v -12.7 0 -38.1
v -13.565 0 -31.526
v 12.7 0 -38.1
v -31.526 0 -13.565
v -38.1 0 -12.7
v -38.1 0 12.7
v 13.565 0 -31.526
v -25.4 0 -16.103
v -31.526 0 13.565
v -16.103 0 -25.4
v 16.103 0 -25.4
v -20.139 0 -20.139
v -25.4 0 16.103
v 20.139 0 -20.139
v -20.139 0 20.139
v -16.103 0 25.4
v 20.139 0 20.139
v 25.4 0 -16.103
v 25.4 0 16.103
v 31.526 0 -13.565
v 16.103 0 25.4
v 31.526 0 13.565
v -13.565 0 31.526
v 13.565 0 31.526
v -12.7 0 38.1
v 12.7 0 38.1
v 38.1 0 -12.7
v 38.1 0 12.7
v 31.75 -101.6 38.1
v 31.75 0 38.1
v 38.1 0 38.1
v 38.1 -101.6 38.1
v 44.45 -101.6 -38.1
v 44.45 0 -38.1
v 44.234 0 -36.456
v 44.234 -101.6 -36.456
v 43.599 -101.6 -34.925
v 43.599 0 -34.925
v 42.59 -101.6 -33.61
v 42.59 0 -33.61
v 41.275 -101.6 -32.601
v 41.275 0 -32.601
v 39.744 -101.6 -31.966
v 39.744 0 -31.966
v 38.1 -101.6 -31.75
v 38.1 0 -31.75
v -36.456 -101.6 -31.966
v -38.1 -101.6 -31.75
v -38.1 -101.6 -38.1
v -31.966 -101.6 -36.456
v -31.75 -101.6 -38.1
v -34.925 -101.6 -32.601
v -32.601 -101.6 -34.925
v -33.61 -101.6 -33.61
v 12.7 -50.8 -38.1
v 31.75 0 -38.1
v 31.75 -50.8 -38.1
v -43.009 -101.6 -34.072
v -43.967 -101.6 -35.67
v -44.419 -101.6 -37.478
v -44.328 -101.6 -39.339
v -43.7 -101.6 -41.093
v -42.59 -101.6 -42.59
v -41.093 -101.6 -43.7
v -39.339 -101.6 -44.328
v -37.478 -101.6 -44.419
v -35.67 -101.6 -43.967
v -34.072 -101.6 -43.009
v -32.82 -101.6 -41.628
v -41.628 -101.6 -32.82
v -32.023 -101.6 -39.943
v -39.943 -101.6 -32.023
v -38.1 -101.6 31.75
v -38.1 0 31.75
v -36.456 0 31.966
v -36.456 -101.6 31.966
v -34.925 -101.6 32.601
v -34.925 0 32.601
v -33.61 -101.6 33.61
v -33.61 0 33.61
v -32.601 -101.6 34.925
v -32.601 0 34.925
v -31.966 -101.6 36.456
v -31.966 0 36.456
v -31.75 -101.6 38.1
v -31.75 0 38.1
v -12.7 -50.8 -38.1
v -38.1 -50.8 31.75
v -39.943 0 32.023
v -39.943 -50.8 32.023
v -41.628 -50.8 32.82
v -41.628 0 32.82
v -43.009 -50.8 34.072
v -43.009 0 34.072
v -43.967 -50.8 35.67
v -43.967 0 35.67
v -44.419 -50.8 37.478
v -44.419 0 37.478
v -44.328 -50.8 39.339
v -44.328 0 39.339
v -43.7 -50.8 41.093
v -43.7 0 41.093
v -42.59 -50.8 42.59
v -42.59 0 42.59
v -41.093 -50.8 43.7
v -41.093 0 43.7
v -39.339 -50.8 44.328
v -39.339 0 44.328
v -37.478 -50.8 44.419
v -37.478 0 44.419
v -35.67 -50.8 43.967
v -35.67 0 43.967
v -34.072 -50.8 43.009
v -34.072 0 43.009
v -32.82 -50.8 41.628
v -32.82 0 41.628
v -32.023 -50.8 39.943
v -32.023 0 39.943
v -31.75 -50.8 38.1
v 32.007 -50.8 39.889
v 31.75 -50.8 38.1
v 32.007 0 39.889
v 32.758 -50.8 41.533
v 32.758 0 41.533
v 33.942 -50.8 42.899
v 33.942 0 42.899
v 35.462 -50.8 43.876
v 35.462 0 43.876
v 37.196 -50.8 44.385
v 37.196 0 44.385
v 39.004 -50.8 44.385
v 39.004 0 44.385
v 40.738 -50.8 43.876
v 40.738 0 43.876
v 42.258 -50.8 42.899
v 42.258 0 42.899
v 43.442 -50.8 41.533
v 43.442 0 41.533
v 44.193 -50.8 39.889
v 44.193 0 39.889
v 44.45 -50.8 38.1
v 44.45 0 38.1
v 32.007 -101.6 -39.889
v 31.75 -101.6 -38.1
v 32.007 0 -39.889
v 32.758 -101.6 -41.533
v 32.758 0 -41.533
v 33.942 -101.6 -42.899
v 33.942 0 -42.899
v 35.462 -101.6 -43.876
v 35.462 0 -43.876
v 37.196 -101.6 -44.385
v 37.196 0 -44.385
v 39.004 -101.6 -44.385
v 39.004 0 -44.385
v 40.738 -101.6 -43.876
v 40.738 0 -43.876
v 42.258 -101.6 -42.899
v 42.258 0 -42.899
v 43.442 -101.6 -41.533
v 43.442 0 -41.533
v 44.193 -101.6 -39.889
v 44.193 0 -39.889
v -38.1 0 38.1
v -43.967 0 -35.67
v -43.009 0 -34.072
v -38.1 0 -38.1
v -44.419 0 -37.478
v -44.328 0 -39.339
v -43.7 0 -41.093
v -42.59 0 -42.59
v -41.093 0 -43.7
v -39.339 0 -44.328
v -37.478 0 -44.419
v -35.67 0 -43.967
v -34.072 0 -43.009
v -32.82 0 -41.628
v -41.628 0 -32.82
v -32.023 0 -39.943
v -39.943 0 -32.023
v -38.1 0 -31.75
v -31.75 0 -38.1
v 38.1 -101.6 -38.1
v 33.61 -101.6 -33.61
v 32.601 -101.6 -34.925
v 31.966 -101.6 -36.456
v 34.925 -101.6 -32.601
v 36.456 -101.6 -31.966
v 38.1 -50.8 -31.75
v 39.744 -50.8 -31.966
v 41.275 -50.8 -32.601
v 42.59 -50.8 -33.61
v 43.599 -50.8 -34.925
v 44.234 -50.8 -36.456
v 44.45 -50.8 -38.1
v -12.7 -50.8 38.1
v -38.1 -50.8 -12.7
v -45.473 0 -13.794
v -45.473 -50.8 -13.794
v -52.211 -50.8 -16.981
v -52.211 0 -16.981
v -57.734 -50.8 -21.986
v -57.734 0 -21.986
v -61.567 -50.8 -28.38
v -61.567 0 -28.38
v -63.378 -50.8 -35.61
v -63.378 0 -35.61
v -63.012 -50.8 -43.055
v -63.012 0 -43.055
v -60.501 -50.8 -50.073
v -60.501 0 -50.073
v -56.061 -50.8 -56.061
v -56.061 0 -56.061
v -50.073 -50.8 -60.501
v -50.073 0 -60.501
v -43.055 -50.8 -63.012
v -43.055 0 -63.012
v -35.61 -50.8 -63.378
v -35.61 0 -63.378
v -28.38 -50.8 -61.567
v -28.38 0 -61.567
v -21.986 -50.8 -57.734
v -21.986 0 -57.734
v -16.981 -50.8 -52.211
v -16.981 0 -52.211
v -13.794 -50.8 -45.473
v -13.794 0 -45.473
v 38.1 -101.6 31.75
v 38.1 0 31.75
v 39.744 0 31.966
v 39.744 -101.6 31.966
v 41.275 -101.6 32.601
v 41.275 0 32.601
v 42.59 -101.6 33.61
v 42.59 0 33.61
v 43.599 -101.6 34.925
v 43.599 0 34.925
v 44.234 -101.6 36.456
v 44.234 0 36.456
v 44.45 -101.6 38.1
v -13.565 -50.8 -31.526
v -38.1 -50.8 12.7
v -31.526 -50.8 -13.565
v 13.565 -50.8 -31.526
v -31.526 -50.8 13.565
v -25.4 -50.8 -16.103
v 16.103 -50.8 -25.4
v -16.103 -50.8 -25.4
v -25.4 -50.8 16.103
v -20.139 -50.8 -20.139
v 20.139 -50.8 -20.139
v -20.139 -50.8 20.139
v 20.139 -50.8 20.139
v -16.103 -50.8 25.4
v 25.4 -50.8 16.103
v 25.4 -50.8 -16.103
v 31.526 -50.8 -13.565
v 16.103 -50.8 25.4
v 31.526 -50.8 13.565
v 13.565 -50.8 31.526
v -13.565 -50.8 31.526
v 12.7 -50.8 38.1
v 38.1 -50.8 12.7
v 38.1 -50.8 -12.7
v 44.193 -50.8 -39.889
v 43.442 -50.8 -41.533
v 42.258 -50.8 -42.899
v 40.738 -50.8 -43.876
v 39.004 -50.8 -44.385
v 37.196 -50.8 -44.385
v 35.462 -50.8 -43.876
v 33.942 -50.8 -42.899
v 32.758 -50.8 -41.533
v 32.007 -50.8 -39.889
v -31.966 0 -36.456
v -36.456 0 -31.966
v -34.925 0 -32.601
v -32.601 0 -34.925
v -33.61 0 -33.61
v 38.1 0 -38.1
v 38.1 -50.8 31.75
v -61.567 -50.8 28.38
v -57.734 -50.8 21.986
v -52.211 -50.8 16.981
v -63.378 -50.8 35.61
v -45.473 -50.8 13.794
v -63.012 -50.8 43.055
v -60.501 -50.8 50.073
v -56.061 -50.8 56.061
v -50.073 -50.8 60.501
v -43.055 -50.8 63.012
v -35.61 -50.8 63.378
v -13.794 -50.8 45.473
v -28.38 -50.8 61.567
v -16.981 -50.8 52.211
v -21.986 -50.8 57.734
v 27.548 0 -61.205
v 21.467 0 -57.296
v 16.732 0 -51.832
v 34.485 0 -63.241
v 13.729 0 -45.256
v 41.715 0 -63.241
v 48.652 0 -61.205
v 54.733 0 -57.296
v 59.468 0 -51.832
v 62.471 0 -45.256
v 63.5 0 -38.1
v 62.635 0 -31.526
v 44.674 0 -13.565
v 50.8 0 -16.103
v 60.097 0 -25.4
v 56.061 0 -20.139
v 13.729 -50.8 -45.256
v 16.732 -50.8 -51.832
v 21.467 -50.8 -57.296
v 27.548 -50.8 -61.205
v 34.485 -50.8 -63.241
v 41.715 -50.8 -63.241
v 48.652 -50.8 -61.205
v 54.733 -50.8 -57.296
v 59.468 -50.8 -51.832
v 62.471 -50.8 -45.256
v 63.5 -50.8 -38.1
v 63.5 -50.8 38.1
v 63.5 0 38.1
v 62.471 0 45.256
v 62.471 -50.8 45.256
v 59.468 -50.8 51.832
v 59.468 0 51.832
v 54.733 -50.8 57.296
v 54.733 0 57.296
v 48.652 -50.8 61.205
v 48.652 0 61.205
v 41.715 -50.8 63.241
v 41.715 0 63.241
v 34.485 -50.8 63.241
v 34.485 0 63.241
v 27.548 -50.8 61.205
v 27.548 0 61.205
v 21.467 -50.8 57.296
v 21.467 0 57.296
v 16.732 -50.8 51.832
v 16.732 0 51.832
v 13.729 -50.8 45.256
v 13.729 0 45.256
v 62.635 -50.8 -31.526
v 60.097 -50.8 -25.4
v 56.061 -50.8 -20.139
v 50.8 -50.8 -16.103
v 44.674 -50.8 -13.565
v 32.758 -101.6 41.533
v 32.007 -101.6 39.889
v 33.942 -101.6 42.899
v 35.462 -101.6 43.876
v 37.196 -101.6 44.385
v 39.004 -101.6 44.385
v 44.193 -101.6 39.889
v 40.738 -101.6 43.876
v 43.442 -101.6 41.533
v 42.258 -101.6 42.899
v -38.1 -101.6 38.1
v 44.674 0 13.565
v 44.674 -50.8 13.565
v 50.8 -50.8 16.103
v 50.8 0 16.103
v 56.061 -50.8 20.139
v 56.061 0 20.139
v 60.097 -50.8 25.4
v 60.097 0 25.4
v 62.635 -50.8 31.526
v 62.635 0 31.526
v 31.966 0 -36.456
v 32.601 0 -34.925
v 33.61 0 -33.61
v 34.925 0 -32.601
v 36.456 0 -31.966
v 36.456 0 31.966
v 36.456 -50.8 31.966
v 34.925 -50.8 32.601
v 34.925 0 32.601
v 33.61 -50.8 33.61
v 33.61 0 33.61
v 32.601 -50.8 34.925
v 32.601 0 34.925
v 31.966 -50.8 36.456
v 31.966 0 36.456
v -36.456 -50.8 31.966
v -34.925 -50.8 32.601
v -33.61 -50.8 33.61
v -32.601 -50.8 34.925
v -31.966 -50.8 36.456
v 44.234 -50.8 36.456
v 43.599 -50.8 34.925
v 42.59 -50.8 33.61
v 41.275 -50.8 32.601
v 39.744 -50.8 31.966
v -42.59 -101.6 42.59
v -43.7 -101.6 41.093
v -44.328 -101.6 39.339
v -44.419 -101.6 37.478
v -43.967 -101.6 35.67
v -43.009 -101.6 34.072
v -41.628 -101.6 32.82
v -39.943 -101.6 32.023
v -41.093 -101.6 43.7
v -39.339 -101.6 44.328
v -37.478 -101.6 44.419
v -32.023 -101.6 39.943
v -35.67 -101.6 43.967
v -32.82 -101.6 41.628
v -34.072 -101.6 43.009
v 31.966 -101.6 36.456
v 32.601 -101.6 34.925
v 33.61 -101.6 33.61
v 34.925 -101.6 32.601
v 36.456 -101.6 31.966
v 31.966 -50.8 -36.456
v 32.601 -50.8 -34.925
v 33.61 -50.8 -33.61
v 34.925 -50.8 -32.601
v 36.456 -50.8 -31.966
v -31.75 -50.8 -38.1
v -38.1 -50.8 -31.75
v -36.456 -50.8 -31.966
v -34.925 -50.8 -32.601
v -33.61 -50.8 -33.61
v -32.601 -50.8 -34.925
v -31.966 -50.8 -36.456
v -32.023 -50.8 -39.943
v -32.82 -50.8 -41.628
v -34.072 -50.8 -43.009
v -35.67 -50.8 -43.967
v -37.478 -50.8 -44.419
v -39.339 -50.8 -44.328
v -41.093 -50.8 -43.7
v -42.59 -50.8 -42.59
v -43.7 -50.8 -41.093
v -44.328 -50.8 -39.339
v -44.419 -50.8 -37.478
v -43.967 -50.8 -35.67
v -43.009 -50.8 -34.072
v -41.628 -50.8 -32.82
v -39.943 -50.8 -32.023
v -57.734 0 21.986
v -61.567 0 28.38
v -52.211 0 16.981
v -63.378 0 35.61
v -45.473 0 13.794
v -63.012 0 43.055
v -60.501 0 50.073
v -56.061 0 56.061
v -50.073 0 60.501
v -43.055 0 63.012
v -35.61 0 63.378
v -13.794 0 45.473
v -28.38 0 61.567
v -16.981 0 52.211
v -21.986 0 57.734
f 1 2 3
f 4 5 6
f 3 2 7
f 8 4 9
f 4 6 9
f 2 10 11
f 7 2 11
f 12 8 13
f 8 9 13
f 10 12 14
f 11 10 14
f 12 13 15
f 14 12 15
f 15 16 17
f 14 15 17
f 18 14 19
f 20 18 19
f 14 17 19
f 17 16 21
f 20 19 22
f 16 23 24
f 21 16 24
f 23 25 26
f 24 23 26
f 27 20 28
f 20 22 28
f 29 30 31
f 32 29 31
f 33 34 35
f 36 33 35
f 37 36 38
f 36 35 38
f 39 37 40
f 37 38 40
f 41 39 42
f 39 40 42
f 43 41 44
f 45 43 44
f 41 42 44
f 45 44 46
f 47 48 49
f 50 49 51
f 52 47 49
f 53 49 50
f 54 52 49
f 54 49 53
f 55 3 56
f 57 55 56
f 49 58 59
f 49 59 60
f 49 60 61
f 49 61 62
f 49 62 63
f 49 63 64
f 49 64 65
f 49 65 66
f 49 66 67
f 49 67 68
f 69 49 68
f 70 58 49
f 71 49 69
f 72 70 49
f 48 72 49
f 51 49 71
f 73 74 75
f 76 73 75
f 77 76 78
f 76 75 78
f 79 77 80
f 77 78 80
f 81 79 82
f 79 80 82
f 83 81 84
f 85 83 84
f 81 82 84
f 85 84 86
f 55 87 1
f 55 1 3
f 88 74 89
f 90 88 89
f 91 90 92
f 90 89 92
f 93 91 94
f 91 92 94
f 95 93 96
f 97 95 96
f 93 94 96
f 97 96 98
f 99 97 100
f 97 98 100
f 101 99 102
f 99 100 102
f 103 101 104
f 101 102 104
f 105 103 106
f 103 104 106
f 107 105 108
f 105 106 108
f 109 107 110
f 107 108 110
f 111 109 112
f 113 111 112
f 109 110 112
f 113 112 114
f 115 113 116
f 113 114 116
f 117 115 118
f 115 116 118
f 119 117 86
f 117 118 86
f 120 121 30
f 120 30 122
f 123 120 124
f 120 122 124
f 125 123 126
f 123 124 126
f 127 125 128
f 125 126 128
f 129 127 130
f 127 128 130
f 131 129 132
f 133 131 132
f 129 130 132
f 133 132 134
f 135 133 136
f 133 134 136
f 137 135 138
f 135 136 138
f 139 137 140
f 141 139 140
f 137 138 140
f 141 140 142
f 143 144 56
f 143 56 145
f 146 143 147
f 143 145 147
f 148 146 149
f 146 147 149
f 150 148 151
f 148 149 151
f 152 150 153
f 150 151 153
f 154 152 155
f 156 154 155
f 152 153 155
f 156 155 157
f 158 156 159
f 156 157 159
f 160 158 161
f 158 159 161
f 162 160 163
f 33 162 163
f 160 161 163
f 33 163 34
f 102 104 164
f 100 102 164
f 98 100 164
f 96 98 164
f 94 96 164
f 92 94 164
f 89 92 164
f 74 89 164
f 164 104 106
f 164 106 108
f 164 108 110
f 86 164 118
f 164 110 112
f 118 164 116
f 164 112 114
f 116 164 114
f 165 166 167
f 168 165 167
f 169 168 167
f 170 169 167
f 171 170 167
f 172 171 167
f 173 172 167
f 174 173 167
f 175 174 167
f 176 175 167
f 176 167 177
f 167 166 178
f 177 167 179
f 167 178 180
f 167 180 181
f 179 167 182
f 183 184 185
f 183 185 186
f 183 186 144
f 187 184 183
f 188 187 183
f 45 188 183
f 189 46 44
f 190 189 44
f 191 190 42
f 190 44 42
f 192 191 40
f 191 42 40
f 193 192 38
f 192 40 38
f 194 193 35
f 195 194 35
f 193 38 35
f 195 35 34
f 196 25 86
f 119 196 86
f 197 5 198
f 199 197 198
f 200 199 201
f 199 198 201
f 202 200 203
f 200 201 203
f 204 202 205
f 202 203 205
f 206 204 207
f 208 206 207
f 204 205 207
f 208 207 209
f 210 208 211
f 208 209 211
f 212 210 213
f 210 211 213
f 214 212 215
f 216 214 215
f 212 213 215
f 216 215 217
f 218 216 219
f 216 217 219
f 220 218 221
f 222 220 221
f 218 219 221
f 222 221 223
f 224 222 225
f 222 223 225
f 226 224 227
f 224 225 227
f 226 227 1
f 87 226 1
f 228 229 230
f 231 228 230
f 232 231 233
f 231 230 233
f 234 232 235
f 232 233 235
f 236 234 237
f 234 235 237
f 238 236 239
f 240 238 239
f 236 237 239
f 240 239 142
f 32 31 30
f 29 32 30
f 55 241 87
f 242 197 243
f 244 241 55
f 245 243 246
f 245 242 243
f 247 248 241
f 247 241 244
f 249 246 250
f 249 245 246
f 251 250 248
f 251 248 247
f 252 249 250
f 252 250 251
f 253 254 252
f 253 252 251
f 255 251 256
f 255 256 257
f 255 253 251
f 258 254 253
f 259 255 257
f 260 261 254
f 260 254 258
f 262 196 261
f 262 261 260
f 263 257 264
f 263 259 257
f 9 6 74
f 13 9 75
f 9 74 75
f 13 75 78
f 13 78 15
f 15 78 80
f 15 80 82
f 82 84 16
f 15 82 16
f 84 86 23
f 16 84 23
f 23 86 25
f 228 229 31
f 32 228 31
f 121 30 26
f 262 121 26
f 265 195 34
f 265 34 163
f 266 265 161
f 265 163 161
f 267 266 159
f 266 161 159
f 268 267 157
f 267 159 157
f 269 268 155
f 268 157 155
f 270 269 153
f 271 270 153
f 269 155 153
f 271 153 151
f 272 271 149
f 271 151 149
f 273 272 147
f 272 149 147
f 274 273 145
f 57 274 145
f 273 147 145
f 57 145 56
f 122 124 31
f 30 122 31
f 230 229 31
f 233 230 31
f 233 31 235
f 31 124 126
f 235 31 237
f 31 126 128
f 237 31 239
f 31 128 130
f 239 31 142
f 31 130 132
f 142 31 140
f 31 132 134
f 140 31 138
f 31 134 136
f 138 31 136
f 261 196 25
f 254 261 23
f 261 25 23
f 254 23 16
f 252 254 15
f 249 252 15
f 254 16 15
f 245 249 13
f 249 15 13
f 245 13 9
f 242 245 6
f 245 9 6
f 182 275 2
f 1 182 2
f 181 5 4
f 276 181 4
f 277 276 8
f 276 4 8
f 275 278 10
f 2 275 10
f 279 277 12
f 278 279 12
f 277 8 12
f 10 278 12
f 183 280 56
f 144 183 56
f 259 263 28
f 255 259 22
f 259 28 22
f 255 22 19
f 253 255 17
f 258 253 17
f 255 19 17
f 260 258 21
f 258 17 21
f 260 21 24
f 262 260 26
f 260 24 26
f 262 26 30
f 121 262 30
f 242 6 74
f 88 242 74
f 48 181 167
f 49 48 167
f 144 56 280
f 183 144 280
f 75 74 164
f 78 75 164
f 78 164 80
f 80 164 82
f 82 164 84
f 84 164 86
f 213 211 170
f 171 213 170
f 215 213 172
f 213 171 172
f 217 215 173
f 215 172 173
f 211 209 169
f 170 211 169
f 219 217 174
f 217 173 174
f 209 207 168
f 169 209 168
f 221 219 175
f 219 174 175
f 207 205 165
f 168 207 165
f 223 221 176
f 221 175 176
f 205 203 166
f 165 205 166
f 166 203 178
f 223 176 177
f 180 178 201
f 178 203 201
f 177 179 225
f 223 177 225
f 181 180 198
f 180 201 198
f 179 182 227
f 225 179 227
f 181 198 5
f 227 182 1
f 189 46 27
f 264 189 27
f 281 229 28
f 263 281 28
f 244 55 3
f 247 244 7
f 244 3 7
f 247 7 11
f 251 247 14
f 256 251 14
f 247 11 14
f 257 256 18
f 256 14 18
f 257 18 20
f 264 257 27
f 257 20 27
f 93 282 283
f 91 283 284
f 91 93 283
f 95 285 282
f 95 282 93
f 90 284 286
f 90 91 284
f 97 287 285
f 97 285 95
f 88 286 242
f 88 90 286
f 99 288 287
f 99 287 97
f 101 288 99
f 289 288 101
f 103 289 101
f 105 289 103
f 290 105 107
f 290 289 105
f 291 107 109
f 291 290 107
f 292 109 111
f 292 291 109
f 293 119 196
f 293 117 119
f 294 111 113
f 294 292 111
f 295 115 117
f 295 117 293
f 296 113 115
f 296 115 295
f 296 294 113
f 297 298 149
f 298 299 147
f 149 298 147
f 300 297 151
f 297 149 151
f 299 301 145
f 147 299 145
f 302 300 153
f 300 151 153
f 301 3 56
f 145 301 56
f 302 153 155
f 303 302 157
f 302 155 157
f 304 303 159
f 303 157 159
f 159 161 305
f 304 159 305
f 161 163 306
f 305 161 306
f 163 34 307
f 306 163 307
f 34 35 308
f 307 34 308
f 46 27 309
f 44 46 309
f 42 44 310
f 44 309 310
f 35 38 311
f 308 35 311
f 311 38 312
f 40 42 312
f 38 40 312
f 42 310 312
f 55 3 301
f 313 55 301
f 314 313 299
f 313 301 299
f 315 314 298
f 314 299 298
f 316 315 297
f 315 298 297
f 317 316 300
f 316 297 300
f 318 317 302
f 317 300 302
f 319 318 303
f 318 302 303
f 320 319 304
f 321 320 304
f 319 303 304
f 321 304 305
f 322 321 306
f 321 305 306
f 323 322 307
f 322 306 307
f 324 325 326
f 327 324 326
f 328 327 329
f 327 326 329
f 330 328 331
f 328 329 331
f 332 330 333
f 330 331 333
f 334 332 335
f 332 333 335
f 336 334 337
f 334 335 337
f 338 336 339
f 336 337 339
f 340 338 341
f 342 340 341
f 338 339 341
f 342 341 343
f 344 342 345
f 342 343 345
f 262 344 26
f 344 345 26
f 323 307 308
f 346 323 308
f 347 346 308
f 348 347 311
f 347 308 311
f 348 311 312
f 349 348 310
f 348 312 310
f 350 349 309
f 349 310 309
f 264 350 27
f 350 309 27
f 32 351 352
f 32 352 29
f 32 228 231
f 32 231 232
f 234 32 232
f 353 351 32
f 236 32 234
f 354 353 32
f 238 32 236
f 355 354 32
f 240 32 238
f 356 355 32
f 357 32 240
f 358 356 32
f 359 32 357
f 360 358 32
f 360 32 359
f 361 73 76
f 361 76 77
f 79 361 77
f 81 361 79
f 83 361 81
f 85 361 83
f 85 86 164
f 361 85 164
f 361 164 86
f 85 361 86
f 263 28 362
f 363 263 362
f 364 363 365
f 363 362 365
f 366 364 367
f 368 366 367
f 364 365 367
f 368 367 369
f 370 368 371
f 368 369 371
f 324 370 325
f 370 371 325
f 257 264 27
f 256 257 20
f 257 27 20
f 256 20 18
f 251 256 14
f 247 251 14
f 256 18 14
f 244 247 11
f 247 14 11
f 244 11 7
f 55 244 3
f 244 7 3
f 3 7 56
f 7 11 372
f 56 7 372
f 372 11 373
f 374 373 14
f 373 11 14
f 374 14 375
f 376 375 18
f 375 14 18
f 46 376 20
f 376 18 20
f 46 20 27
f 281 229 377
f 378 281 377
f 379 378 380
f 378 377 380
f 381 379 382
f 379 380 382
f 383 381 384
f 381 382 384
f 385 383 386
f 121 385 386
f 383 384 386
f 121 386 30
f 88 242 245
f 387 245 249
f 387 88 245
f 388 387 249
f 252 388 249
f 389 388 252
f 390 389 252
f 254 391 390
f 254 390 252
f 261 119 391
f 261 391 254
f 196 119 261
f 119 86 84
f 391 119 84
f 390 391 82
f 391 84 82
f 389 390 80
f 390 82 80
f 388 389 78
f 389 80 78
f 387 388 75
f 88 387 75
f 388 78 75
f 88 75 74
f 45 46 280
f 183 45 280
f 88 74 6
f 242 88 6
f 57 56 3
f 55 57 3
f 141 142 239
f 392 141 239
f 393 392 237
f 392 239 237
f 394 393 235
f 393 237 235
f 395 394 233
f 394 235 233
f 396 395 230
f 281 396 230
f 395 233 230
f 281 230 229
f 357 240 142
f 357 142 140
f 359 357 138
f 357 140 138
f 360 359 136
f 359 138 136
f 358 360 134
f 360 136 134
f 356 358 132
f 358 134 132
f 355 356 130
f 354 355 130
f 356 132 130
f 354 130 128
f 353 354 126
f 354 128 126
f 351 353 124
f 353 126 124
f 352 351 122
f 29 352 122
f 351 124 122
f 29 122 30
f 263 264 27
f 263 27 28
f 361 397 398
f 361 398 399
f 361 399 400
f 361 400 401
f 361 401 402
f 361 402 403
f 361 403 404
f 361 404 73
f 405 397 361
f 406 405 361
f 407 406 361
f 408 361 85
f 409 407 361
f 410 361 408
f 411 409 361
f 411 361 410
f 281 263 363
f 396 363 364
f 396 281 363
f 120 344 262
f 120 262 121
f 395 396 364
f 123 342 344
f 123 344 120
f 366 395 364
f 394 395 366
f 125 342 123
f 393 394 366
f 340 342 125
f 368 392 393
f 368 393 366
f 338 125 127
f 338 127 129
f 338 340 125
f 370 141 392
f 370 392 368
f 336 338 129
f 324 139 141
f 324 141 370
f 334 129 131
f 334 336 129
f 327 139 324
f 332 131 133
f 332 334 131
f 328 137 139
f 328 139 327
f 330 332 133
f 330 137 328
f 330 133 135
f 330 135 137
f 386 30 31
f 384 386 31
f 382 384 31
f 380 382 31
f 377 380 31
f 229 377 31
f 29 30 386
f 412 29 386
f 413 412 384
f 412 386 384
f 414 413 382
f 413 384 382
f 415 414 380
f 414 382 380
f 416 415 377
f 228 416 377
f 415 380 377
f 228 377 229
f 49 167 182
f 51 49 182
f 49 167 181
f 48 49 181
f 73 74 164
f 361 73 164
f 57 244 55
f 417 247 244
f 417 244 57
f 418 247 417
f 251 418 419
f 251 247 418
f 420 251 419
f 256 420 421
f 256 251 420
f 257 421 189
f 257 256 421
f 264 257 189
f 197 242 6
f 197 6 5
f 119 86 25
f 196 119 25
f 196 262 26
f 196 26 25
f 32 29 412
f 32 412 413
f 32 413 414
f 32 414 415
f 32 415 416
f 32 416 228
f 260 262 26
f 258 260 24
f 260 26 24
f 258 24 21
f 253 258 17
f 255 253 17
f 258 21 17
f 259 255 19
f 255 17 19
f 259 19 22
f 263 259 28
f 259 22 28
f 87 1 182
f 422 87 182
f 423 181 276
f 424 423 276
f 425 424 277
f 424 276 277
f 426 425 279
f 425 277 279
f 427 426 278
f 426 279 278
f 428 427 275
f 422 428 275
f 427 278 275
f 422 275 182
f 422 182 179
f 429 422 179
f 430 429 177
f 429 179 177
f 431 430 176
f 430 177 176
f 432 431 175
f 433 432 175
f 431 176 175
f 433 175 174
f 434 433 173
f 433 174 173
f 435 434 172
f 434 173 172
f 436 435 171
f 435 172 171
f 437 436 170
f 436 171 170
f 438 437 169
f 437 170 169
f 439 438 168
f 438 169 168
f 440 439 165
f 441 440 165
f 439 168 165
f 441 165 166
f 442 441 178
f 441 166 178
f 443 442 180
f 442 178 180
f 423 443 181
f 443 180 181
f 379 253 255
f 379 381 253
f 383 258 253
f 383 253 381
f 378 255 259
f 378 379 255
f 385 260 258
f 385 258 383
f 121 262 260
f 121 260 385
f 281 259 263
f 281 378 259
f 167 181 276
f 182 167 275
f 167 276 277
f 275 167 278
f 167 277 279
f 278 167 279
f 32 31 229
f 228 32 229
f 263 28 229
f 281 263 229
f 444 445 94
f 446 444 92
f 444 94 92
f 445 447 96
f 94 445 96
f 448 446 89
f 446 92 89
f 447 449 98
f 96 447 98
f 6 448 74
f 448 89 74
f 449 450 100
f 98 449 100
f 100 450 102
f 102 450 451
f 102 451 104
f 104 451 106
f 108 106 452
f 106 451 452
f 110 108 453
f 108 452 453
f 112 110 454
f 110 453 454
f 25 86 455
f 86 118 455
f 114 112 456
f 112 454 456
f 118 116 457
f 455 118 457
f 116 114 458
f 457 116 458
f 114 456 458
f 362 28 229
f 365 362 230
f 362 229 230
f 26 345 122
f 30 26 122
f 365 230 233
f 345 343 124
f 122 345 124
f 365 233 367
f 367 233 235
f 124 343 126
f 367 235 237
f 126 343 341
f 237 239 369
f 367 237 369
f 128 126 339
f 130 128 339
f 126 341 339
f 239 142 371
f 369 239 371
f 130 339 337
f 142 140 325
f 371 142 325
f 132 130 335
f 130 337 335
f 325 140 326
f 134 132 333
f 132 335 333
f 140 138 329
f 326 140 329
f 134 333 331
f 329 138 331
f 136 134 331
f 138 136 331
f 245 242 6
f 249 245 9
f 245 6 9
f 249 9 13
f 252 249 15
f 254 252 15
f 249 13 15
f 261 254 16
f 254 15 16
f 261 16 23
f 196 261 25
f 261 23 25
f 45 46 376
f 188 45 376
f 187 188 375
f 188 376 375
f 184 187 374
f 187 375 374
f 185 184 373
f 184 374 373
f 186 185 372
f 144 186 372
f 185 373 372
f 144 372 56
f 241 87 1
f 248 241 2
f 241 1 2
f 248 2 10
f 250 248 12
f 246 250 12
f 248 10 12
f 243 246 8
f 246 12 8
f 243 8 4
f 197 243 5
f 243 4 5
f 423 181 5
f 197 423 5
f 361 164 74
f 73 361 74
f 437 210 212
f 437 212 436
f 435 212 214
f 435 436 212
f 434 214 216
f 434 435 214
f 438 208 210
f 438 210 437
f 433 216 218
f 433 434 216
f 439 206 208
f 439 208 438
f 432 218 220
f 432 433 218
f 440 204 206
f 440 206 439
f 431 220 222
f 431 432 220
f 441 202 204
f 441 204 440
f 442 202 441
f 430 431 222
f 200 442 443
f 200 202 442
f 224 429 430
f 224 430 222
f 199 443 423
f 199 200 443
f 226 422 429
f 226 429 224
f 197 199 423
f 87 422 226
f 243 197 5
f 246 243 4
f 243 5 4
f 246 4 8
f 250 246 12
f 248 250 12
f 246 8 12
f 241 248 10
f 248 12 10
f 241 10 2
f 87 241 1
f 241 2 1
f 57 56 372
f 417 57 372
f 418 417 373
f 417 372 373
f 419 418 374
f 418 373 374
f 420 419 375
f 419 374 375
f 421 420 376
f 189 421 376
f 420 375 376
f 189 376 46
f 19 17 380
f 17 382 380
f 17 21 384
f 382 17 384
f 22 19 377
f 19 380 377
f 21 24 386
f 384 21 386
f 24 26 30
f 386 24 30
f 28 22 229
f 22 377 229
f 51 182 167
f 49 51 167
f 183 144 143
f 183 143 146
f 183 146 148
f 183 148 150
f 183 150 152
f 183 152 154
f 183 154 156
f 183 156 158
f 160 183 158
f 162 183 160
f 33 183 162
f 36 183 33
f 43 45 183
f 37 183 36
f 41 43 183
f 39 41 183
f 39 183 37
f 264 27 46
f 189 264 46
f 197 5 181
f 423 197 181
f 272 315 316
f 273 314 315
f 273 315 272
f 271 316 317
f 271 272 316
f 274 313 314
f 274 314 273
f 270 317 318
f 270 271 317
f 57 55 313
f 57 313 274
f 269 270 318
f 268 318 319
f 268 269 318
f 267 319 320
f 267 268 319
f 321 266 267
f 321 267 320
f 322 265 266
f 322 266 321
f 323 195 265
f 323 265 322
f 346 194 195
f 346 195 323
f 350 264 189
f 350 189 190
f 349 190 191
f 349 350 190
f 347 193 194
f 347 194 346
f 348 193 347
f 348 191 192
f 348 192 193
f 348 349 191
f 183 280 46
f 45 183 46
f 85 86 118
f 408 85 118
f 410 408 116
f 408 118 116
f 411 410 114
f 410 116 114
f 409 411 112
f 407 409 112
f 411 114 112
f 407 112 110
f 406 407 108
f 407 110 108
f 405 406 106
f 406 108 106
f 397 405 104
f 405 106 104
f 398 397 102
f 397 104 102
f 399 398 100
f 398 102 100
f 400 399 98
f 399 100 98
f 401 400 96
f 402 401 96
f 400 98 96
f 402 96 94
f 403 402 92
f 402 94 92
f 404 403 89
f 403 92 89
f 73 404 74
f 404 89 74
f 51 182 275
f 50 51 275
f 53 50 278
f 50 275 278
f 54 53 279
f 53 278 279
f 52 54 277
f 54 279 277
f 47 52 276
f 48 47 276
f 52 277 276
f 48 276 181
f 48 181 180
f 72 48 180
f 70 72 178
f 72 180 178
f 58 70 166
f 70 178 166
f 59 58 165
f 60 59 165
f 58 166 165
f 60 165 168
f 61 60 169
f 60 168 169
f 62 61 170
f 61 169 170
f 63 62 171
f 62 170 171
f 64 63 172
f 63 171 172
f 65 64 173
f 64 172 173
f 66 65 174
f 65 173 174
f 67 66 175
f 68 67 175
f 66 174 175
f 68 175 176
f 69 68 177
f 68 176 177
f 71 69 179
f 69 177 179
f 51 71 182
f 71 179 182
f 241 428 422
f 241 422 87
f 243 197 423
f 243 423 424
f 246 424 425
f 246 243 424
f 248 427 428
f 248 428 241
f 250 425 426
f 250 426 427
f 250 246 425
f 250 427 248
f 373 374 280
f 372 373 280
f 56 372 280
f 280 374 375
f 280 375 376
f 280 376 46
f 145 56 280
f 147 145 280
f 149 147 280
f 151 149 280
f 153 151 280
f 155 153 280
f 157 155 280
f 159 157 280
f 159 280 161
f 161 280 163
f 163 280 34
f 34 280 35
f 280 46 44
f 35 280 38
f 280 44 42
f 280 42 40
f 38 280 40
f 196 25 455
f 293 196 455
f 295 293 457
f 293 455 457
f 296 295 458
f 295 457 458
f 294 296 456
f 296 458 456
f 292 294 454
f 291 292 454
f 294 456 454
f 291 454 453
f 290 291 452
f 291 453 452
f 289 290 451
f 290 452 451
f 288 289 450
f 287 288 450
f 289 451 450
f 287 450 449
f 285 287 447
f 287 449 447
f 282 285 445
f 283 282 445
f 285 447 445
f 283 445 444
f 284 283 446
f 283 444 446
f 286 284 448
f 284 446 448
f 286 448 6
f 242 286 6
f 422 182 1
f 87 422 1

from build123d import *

# Parameters (mm, degrees)
F1_DEPTH = 50.8
F2_DEPTH = 101.6
F3_DEPTH = 50.8
F4_DEPTH = 101.6


with BuildPart() as f1:
    # F0 (on Front) → F1 (new body)
    with BuildSketch(Plane.XZ):
        with BuildLine():
            Line((12.7, 38.1), (-12.7, 38.1))
            ThreePointArc((-12.7, 38.1), (-20.1394877579, 20.1394877579), (-38.1, 12.7))
            Line((-38.1, 12.7), (-38.1, -12.7))
            ThreePointArc((-38.1, -12.7), (-20.1394877579, -20.1394877579), (-12.7, -38.1))
            Line((-12.7, -38.1), (12.7, -38.1))
            ThreePointArc((12.7, -38.1), (20.1394877579, -20.1394877579), (38.1, -12.7))
            Line((38.1, -12.7), (38.1, 12.7))
            ThreePointArc((38.1, 12.7), (20.1394877579, 20.1394877579), (12.7, 38.1))
        make_face()
    extrude(amount=F1_DEPTH)


with BuildPart() as f1b:
    # F0 (on Front) → F1, piece 2 (new body)
    with BuildSketch(Plane.XZ):
        with BuildLine():
            Line((-31.75, 38.1), (-12.7, 38.1))
            ThreePointArc((-12.7, 38.1), (-56.0605122421, 56.0605122421), (-38.1, 12.7))
            Line((-38.1, 12.7), (-38.1, 31.75))
            ThreePointArc((-38.1, 31.75), (-42.5901280605, 42.5901280605), (-31.75, 38.1))
        make_face()
    extrude(amount=F1_DEPTH)


with BuildPart() as f1c:
    # F0 (on Front) → F1, piece 3 (new body)
    with BuildSketch(Plane.XZ):
        with BuildLine():
            ThreePointArc((63.5, 38.1), (38.1, 63.5), (12.7, 38.1))
            Line((12.7, 38.1), (31.75, 38.1))
            ThreePointArc((31.75, 38.1), (38.1, 44.45), (44.45, 38.1))
            ThreePointArc((44.45, 38.1), (42.5901280605, 33.6098719395), (38.1, 31.75))
            Line((38.1, 31.75), (38.1, 12.7))
            ThreePointArc((38.1, 12.7), (56.0605122421, 20.1394877579), (63.5, 38.1))
        make_face()
    extrude(amount=F1_DEPTH)


with BuildPart() as f1d:
    # F0 (on Front) → F1, piece 4 (new body)
    with BuildSketch(Plane.XZ):
        with BuildLine():
            ThreePointArc((63.5, -38.1), (56.0605122421, -20.1394877579), (38.1, -12.7))
            Line((38.1, -12.7), (38.1, -31.75))
            ThreePointArc((38.1, -31.75), (42.5901280605, -33.6098719395), (44.45, -38.1))
            ThreePointArc((44.45, -38.1), (38.1, -44.45), (31.75, -38.1))
            Line((31.75, -38.1), (12.7, -38.1))
            ThreePointArc((12.7, -38.1), (38.1, -63.5), (63.5, -38.1))
        make_face()
    extrude(amount=F1_DEPTH)


with BuildPart() as f1e:
    # F0 (on Front) → F1, piece 5 (new body)
    with BuildSketch(Plane.XZ):
        with BuildLine():
            Line((-38.1, -31.75), (-38.1, -12.7))
            ThreePointArc((-38.1, -12.7), (-56.0605122421, -56.0605122421), (-12.7, -38.1))
            Line((-12.7, -38.1), (-31.75, -38.1))
            ThreePointArc((-31.75, -38.1), (-42.5901280605, -42.5901280605), (-38.1, -31.75))
        make_face()
    extrude(amount=F1_DEPTH)


with BuildPart() as f2:
    # F0 (on Front) → F2 (new body)
    with BuildSketch(Plane.XZ):
        with BuildLine():
            Line((-38.1, 38.1), (-31.75, 38.1))
            ThreePointArc((-31.75, 38.1), (-42.5901280605, 42.5901280605), (-38.1, 31.75))
            Line((-38.1, 31.75), (-38.1, 38.1))
        make_face()
    extrude(amount=F2_DEPTH)


with BuildPart() as f2b:
    # F0 (on Front) → F2, piece 2 (new body)
    with BuildSketch(Plane.XZ):
        with BuildLine():
            ThreePointArc((44.45, 38.1), (38.1, 44.45), (31.75, 38.1))
            Line((31.75, 38.1), (38.1, 38.1))
            Line((38.1, 38.1), (38.1, 31.75))
            ThreePointArc((38.1, 31.75), (42.5901280605, 33.6098719395), (44.45, 38.1))
        make_face()
    extrude(amount=F2_DEPTH)


with BuildPart() as f2c:
    # F0 (on Front) → F2, piece 3 (new body)
    with BuildSketch(Plane.XZ):
        with BuildLine():
            ThreePointArc((44.45, -38.1), (42.5901280605, -33.6098719395), (38.1, -31.75))
            Line((38.1, -31.75), (38.1, -38.1))
            Line((38.1, -38.1), (31.75, -38.1))
            ThreePointArc((31.75, -38.1), (38.1, -44.45), (44.45, -38.1))
        make_face()
    extrude(amount=F2_DEPTH)


with BuildPart() as f2d:
    # F0 (on Front) → F2, piece 4 (new body)
    with BuildSketch(Plane.XZ):
        with BuildLine():
            Line((-38.1, -38.1), (-38.1, -31.75))
            ThreePointArc((-38.1, -31.75), (-42.5901280605, -42.5901280605), (-31.75, -38.1))
            Line((-31.75, -38.1), (-38.1, -38.1))
        make_face()
    extrude(amount=F2_DEPTH)


with BuildPart() as f3:
    # F0 (on Front) → F3 (new body)
    with BuildSketch(Plane.XZ):
        with BuildLine():
            ThreePointArc((-12.7, -38.1), (-20.1394877579, -20.1394877579), (-38.1, -12.7))
            Line((-38.1, -12.7), (-38.1, -31.75))
            ThreePointArc((-38.1, -31.75), (-33.6098719395, -33.6098719395), (-31.75, -38.1))
            Line((-31.75, -38.1), (-12.7, -38.1))
        make_face()
    extrude(amount=F3_DEPTH)


with BuildPart() as f3b:
    # F0 (on Front) → F3, piece 2 (new body)
    with BuildSketch(Plane.XZ):
        with BuildLine():
            Line((38.1, -31.75), (38.1, -12.7))
            ThreePointArc((38.1, -12.7), (20.1394877579, -20.1394877579), (12.7, -38.1))
            Line((12.7, -38.1), (31.75, -38.1))
            ThreePointArc((31.75, -38.1), (33.6098719395, -33.6098719395), (38.1, -31.75))
        make_face()
    extrude(amount=F3_DEPTH)


with BuildPart() as f3c:
    # F0 (on Front) → F3, piece 3 (new body)
    with BuildSketch(Plane.XZ):
        with BuildLine():
            Line((31.75, 38.1), (12.7, 38.1))
            ThreePointArc((12.7, 38.1), (20.1394877579, 20.1394877579), (38.1, 12.7))
            Line((38.1, 12.7), (38.1, 31.75))
            ThreePointArc((38.1, 31.75), (33.6098719395, 33.6098719395), (31.75, 38.1))
        make_face()
    extrude(amount=F3_DEPTH)


with BuildPart() as f3d:
    # F0 (on Front) → F3, piece 4 (new body)
    with BuildSketch(Plane.XZ):
        with BuildLine():
            ThreePointArc((-38.1, 12.7), (-20.1394877579, 20.1394877579), (-12.7, 38.1))
            Line((-12.7, 38.1), (-31.75, 38.1))
            ThreePointArc((-31.75, 38.1), (-33.6098719395, 33.6098719395), (-38.1, 31.75))
            Line((-38.1, 31.75), (-38.1, 12.7))
        make_face()
    extrude(amount=F3_DEPTH)


with BuildPart() as f4:
    # F0 (on Front) → F4 (new body)
    with BuildSketch(Plane.XZ):
        with BuildLine():
            ThreePointArc((-38.1, 31.75), (-33.6098719395, 33.6098719395), (-31.75, 38.1))
            Line((-31.75, 38.1), (-38.1, 38.1))
            Line((-38.1, 38.1), (-38.1, 31.75))
        make_face()
    extrude(amount=F4_DEPTH)


with BuildPart() as f4b:
    # F0 (on Front) → F4, piece 2 (new body)
    with BuildSketch(Plane.XZ):
        with BuildLine():
            ThreePointArc((-31.75, -38.1), (-33.6098719395, -33.6098719395), (-38.1, -31.75))
            Line((-38.1, -31.75), (-38.1, -38.1))
            Line((-38.1, -38.1), (-31.75, -38.1))
        make_face()
    extrude(amount=F4_DEPTH)


with BuildPart() as f4c:
    # F0 (on Front) → F4, piece 3 (new body)
    with BuildSketch(Plane.XZ):
        with BuildLine():
            Line((38.1, -38.1), (38.1, -31.75))
            ThreePointArc((38.1, -31.75), (33.6098719395, -33.6098719395), (31.75, -38.1))
            Line((31.75, -38.1), (38.1, -38.1))
        make_face()
    extrude(amount=F4_DEPTH)


with BuildPart() as f4d:
    # F0 (on Front) → F4, piece 4 (new body)
    with BuildSketch(Plane.XZ):
        with BuildLine():
            Line((38.1, 38.1), (31.75, 38.1))
            ThreePointArc((31.75, 38.1), (33.6098719395, 33.6098719395), (38.1, 31.75))
            Line((38.1, 31.75), (38.1, 38.1))
        make_face()
    extrude(amount=F4_DEPTH)


solid = Compound([f1.part, f1b.part, f1c.part, f1d.part, f1e.part, f2.part, f2b.part, f2c.part, f2d.part, f3.part, f3b.part, f3c.part, f3d.part, f4.part, f4b.part, f4c.part, f4d.part])
